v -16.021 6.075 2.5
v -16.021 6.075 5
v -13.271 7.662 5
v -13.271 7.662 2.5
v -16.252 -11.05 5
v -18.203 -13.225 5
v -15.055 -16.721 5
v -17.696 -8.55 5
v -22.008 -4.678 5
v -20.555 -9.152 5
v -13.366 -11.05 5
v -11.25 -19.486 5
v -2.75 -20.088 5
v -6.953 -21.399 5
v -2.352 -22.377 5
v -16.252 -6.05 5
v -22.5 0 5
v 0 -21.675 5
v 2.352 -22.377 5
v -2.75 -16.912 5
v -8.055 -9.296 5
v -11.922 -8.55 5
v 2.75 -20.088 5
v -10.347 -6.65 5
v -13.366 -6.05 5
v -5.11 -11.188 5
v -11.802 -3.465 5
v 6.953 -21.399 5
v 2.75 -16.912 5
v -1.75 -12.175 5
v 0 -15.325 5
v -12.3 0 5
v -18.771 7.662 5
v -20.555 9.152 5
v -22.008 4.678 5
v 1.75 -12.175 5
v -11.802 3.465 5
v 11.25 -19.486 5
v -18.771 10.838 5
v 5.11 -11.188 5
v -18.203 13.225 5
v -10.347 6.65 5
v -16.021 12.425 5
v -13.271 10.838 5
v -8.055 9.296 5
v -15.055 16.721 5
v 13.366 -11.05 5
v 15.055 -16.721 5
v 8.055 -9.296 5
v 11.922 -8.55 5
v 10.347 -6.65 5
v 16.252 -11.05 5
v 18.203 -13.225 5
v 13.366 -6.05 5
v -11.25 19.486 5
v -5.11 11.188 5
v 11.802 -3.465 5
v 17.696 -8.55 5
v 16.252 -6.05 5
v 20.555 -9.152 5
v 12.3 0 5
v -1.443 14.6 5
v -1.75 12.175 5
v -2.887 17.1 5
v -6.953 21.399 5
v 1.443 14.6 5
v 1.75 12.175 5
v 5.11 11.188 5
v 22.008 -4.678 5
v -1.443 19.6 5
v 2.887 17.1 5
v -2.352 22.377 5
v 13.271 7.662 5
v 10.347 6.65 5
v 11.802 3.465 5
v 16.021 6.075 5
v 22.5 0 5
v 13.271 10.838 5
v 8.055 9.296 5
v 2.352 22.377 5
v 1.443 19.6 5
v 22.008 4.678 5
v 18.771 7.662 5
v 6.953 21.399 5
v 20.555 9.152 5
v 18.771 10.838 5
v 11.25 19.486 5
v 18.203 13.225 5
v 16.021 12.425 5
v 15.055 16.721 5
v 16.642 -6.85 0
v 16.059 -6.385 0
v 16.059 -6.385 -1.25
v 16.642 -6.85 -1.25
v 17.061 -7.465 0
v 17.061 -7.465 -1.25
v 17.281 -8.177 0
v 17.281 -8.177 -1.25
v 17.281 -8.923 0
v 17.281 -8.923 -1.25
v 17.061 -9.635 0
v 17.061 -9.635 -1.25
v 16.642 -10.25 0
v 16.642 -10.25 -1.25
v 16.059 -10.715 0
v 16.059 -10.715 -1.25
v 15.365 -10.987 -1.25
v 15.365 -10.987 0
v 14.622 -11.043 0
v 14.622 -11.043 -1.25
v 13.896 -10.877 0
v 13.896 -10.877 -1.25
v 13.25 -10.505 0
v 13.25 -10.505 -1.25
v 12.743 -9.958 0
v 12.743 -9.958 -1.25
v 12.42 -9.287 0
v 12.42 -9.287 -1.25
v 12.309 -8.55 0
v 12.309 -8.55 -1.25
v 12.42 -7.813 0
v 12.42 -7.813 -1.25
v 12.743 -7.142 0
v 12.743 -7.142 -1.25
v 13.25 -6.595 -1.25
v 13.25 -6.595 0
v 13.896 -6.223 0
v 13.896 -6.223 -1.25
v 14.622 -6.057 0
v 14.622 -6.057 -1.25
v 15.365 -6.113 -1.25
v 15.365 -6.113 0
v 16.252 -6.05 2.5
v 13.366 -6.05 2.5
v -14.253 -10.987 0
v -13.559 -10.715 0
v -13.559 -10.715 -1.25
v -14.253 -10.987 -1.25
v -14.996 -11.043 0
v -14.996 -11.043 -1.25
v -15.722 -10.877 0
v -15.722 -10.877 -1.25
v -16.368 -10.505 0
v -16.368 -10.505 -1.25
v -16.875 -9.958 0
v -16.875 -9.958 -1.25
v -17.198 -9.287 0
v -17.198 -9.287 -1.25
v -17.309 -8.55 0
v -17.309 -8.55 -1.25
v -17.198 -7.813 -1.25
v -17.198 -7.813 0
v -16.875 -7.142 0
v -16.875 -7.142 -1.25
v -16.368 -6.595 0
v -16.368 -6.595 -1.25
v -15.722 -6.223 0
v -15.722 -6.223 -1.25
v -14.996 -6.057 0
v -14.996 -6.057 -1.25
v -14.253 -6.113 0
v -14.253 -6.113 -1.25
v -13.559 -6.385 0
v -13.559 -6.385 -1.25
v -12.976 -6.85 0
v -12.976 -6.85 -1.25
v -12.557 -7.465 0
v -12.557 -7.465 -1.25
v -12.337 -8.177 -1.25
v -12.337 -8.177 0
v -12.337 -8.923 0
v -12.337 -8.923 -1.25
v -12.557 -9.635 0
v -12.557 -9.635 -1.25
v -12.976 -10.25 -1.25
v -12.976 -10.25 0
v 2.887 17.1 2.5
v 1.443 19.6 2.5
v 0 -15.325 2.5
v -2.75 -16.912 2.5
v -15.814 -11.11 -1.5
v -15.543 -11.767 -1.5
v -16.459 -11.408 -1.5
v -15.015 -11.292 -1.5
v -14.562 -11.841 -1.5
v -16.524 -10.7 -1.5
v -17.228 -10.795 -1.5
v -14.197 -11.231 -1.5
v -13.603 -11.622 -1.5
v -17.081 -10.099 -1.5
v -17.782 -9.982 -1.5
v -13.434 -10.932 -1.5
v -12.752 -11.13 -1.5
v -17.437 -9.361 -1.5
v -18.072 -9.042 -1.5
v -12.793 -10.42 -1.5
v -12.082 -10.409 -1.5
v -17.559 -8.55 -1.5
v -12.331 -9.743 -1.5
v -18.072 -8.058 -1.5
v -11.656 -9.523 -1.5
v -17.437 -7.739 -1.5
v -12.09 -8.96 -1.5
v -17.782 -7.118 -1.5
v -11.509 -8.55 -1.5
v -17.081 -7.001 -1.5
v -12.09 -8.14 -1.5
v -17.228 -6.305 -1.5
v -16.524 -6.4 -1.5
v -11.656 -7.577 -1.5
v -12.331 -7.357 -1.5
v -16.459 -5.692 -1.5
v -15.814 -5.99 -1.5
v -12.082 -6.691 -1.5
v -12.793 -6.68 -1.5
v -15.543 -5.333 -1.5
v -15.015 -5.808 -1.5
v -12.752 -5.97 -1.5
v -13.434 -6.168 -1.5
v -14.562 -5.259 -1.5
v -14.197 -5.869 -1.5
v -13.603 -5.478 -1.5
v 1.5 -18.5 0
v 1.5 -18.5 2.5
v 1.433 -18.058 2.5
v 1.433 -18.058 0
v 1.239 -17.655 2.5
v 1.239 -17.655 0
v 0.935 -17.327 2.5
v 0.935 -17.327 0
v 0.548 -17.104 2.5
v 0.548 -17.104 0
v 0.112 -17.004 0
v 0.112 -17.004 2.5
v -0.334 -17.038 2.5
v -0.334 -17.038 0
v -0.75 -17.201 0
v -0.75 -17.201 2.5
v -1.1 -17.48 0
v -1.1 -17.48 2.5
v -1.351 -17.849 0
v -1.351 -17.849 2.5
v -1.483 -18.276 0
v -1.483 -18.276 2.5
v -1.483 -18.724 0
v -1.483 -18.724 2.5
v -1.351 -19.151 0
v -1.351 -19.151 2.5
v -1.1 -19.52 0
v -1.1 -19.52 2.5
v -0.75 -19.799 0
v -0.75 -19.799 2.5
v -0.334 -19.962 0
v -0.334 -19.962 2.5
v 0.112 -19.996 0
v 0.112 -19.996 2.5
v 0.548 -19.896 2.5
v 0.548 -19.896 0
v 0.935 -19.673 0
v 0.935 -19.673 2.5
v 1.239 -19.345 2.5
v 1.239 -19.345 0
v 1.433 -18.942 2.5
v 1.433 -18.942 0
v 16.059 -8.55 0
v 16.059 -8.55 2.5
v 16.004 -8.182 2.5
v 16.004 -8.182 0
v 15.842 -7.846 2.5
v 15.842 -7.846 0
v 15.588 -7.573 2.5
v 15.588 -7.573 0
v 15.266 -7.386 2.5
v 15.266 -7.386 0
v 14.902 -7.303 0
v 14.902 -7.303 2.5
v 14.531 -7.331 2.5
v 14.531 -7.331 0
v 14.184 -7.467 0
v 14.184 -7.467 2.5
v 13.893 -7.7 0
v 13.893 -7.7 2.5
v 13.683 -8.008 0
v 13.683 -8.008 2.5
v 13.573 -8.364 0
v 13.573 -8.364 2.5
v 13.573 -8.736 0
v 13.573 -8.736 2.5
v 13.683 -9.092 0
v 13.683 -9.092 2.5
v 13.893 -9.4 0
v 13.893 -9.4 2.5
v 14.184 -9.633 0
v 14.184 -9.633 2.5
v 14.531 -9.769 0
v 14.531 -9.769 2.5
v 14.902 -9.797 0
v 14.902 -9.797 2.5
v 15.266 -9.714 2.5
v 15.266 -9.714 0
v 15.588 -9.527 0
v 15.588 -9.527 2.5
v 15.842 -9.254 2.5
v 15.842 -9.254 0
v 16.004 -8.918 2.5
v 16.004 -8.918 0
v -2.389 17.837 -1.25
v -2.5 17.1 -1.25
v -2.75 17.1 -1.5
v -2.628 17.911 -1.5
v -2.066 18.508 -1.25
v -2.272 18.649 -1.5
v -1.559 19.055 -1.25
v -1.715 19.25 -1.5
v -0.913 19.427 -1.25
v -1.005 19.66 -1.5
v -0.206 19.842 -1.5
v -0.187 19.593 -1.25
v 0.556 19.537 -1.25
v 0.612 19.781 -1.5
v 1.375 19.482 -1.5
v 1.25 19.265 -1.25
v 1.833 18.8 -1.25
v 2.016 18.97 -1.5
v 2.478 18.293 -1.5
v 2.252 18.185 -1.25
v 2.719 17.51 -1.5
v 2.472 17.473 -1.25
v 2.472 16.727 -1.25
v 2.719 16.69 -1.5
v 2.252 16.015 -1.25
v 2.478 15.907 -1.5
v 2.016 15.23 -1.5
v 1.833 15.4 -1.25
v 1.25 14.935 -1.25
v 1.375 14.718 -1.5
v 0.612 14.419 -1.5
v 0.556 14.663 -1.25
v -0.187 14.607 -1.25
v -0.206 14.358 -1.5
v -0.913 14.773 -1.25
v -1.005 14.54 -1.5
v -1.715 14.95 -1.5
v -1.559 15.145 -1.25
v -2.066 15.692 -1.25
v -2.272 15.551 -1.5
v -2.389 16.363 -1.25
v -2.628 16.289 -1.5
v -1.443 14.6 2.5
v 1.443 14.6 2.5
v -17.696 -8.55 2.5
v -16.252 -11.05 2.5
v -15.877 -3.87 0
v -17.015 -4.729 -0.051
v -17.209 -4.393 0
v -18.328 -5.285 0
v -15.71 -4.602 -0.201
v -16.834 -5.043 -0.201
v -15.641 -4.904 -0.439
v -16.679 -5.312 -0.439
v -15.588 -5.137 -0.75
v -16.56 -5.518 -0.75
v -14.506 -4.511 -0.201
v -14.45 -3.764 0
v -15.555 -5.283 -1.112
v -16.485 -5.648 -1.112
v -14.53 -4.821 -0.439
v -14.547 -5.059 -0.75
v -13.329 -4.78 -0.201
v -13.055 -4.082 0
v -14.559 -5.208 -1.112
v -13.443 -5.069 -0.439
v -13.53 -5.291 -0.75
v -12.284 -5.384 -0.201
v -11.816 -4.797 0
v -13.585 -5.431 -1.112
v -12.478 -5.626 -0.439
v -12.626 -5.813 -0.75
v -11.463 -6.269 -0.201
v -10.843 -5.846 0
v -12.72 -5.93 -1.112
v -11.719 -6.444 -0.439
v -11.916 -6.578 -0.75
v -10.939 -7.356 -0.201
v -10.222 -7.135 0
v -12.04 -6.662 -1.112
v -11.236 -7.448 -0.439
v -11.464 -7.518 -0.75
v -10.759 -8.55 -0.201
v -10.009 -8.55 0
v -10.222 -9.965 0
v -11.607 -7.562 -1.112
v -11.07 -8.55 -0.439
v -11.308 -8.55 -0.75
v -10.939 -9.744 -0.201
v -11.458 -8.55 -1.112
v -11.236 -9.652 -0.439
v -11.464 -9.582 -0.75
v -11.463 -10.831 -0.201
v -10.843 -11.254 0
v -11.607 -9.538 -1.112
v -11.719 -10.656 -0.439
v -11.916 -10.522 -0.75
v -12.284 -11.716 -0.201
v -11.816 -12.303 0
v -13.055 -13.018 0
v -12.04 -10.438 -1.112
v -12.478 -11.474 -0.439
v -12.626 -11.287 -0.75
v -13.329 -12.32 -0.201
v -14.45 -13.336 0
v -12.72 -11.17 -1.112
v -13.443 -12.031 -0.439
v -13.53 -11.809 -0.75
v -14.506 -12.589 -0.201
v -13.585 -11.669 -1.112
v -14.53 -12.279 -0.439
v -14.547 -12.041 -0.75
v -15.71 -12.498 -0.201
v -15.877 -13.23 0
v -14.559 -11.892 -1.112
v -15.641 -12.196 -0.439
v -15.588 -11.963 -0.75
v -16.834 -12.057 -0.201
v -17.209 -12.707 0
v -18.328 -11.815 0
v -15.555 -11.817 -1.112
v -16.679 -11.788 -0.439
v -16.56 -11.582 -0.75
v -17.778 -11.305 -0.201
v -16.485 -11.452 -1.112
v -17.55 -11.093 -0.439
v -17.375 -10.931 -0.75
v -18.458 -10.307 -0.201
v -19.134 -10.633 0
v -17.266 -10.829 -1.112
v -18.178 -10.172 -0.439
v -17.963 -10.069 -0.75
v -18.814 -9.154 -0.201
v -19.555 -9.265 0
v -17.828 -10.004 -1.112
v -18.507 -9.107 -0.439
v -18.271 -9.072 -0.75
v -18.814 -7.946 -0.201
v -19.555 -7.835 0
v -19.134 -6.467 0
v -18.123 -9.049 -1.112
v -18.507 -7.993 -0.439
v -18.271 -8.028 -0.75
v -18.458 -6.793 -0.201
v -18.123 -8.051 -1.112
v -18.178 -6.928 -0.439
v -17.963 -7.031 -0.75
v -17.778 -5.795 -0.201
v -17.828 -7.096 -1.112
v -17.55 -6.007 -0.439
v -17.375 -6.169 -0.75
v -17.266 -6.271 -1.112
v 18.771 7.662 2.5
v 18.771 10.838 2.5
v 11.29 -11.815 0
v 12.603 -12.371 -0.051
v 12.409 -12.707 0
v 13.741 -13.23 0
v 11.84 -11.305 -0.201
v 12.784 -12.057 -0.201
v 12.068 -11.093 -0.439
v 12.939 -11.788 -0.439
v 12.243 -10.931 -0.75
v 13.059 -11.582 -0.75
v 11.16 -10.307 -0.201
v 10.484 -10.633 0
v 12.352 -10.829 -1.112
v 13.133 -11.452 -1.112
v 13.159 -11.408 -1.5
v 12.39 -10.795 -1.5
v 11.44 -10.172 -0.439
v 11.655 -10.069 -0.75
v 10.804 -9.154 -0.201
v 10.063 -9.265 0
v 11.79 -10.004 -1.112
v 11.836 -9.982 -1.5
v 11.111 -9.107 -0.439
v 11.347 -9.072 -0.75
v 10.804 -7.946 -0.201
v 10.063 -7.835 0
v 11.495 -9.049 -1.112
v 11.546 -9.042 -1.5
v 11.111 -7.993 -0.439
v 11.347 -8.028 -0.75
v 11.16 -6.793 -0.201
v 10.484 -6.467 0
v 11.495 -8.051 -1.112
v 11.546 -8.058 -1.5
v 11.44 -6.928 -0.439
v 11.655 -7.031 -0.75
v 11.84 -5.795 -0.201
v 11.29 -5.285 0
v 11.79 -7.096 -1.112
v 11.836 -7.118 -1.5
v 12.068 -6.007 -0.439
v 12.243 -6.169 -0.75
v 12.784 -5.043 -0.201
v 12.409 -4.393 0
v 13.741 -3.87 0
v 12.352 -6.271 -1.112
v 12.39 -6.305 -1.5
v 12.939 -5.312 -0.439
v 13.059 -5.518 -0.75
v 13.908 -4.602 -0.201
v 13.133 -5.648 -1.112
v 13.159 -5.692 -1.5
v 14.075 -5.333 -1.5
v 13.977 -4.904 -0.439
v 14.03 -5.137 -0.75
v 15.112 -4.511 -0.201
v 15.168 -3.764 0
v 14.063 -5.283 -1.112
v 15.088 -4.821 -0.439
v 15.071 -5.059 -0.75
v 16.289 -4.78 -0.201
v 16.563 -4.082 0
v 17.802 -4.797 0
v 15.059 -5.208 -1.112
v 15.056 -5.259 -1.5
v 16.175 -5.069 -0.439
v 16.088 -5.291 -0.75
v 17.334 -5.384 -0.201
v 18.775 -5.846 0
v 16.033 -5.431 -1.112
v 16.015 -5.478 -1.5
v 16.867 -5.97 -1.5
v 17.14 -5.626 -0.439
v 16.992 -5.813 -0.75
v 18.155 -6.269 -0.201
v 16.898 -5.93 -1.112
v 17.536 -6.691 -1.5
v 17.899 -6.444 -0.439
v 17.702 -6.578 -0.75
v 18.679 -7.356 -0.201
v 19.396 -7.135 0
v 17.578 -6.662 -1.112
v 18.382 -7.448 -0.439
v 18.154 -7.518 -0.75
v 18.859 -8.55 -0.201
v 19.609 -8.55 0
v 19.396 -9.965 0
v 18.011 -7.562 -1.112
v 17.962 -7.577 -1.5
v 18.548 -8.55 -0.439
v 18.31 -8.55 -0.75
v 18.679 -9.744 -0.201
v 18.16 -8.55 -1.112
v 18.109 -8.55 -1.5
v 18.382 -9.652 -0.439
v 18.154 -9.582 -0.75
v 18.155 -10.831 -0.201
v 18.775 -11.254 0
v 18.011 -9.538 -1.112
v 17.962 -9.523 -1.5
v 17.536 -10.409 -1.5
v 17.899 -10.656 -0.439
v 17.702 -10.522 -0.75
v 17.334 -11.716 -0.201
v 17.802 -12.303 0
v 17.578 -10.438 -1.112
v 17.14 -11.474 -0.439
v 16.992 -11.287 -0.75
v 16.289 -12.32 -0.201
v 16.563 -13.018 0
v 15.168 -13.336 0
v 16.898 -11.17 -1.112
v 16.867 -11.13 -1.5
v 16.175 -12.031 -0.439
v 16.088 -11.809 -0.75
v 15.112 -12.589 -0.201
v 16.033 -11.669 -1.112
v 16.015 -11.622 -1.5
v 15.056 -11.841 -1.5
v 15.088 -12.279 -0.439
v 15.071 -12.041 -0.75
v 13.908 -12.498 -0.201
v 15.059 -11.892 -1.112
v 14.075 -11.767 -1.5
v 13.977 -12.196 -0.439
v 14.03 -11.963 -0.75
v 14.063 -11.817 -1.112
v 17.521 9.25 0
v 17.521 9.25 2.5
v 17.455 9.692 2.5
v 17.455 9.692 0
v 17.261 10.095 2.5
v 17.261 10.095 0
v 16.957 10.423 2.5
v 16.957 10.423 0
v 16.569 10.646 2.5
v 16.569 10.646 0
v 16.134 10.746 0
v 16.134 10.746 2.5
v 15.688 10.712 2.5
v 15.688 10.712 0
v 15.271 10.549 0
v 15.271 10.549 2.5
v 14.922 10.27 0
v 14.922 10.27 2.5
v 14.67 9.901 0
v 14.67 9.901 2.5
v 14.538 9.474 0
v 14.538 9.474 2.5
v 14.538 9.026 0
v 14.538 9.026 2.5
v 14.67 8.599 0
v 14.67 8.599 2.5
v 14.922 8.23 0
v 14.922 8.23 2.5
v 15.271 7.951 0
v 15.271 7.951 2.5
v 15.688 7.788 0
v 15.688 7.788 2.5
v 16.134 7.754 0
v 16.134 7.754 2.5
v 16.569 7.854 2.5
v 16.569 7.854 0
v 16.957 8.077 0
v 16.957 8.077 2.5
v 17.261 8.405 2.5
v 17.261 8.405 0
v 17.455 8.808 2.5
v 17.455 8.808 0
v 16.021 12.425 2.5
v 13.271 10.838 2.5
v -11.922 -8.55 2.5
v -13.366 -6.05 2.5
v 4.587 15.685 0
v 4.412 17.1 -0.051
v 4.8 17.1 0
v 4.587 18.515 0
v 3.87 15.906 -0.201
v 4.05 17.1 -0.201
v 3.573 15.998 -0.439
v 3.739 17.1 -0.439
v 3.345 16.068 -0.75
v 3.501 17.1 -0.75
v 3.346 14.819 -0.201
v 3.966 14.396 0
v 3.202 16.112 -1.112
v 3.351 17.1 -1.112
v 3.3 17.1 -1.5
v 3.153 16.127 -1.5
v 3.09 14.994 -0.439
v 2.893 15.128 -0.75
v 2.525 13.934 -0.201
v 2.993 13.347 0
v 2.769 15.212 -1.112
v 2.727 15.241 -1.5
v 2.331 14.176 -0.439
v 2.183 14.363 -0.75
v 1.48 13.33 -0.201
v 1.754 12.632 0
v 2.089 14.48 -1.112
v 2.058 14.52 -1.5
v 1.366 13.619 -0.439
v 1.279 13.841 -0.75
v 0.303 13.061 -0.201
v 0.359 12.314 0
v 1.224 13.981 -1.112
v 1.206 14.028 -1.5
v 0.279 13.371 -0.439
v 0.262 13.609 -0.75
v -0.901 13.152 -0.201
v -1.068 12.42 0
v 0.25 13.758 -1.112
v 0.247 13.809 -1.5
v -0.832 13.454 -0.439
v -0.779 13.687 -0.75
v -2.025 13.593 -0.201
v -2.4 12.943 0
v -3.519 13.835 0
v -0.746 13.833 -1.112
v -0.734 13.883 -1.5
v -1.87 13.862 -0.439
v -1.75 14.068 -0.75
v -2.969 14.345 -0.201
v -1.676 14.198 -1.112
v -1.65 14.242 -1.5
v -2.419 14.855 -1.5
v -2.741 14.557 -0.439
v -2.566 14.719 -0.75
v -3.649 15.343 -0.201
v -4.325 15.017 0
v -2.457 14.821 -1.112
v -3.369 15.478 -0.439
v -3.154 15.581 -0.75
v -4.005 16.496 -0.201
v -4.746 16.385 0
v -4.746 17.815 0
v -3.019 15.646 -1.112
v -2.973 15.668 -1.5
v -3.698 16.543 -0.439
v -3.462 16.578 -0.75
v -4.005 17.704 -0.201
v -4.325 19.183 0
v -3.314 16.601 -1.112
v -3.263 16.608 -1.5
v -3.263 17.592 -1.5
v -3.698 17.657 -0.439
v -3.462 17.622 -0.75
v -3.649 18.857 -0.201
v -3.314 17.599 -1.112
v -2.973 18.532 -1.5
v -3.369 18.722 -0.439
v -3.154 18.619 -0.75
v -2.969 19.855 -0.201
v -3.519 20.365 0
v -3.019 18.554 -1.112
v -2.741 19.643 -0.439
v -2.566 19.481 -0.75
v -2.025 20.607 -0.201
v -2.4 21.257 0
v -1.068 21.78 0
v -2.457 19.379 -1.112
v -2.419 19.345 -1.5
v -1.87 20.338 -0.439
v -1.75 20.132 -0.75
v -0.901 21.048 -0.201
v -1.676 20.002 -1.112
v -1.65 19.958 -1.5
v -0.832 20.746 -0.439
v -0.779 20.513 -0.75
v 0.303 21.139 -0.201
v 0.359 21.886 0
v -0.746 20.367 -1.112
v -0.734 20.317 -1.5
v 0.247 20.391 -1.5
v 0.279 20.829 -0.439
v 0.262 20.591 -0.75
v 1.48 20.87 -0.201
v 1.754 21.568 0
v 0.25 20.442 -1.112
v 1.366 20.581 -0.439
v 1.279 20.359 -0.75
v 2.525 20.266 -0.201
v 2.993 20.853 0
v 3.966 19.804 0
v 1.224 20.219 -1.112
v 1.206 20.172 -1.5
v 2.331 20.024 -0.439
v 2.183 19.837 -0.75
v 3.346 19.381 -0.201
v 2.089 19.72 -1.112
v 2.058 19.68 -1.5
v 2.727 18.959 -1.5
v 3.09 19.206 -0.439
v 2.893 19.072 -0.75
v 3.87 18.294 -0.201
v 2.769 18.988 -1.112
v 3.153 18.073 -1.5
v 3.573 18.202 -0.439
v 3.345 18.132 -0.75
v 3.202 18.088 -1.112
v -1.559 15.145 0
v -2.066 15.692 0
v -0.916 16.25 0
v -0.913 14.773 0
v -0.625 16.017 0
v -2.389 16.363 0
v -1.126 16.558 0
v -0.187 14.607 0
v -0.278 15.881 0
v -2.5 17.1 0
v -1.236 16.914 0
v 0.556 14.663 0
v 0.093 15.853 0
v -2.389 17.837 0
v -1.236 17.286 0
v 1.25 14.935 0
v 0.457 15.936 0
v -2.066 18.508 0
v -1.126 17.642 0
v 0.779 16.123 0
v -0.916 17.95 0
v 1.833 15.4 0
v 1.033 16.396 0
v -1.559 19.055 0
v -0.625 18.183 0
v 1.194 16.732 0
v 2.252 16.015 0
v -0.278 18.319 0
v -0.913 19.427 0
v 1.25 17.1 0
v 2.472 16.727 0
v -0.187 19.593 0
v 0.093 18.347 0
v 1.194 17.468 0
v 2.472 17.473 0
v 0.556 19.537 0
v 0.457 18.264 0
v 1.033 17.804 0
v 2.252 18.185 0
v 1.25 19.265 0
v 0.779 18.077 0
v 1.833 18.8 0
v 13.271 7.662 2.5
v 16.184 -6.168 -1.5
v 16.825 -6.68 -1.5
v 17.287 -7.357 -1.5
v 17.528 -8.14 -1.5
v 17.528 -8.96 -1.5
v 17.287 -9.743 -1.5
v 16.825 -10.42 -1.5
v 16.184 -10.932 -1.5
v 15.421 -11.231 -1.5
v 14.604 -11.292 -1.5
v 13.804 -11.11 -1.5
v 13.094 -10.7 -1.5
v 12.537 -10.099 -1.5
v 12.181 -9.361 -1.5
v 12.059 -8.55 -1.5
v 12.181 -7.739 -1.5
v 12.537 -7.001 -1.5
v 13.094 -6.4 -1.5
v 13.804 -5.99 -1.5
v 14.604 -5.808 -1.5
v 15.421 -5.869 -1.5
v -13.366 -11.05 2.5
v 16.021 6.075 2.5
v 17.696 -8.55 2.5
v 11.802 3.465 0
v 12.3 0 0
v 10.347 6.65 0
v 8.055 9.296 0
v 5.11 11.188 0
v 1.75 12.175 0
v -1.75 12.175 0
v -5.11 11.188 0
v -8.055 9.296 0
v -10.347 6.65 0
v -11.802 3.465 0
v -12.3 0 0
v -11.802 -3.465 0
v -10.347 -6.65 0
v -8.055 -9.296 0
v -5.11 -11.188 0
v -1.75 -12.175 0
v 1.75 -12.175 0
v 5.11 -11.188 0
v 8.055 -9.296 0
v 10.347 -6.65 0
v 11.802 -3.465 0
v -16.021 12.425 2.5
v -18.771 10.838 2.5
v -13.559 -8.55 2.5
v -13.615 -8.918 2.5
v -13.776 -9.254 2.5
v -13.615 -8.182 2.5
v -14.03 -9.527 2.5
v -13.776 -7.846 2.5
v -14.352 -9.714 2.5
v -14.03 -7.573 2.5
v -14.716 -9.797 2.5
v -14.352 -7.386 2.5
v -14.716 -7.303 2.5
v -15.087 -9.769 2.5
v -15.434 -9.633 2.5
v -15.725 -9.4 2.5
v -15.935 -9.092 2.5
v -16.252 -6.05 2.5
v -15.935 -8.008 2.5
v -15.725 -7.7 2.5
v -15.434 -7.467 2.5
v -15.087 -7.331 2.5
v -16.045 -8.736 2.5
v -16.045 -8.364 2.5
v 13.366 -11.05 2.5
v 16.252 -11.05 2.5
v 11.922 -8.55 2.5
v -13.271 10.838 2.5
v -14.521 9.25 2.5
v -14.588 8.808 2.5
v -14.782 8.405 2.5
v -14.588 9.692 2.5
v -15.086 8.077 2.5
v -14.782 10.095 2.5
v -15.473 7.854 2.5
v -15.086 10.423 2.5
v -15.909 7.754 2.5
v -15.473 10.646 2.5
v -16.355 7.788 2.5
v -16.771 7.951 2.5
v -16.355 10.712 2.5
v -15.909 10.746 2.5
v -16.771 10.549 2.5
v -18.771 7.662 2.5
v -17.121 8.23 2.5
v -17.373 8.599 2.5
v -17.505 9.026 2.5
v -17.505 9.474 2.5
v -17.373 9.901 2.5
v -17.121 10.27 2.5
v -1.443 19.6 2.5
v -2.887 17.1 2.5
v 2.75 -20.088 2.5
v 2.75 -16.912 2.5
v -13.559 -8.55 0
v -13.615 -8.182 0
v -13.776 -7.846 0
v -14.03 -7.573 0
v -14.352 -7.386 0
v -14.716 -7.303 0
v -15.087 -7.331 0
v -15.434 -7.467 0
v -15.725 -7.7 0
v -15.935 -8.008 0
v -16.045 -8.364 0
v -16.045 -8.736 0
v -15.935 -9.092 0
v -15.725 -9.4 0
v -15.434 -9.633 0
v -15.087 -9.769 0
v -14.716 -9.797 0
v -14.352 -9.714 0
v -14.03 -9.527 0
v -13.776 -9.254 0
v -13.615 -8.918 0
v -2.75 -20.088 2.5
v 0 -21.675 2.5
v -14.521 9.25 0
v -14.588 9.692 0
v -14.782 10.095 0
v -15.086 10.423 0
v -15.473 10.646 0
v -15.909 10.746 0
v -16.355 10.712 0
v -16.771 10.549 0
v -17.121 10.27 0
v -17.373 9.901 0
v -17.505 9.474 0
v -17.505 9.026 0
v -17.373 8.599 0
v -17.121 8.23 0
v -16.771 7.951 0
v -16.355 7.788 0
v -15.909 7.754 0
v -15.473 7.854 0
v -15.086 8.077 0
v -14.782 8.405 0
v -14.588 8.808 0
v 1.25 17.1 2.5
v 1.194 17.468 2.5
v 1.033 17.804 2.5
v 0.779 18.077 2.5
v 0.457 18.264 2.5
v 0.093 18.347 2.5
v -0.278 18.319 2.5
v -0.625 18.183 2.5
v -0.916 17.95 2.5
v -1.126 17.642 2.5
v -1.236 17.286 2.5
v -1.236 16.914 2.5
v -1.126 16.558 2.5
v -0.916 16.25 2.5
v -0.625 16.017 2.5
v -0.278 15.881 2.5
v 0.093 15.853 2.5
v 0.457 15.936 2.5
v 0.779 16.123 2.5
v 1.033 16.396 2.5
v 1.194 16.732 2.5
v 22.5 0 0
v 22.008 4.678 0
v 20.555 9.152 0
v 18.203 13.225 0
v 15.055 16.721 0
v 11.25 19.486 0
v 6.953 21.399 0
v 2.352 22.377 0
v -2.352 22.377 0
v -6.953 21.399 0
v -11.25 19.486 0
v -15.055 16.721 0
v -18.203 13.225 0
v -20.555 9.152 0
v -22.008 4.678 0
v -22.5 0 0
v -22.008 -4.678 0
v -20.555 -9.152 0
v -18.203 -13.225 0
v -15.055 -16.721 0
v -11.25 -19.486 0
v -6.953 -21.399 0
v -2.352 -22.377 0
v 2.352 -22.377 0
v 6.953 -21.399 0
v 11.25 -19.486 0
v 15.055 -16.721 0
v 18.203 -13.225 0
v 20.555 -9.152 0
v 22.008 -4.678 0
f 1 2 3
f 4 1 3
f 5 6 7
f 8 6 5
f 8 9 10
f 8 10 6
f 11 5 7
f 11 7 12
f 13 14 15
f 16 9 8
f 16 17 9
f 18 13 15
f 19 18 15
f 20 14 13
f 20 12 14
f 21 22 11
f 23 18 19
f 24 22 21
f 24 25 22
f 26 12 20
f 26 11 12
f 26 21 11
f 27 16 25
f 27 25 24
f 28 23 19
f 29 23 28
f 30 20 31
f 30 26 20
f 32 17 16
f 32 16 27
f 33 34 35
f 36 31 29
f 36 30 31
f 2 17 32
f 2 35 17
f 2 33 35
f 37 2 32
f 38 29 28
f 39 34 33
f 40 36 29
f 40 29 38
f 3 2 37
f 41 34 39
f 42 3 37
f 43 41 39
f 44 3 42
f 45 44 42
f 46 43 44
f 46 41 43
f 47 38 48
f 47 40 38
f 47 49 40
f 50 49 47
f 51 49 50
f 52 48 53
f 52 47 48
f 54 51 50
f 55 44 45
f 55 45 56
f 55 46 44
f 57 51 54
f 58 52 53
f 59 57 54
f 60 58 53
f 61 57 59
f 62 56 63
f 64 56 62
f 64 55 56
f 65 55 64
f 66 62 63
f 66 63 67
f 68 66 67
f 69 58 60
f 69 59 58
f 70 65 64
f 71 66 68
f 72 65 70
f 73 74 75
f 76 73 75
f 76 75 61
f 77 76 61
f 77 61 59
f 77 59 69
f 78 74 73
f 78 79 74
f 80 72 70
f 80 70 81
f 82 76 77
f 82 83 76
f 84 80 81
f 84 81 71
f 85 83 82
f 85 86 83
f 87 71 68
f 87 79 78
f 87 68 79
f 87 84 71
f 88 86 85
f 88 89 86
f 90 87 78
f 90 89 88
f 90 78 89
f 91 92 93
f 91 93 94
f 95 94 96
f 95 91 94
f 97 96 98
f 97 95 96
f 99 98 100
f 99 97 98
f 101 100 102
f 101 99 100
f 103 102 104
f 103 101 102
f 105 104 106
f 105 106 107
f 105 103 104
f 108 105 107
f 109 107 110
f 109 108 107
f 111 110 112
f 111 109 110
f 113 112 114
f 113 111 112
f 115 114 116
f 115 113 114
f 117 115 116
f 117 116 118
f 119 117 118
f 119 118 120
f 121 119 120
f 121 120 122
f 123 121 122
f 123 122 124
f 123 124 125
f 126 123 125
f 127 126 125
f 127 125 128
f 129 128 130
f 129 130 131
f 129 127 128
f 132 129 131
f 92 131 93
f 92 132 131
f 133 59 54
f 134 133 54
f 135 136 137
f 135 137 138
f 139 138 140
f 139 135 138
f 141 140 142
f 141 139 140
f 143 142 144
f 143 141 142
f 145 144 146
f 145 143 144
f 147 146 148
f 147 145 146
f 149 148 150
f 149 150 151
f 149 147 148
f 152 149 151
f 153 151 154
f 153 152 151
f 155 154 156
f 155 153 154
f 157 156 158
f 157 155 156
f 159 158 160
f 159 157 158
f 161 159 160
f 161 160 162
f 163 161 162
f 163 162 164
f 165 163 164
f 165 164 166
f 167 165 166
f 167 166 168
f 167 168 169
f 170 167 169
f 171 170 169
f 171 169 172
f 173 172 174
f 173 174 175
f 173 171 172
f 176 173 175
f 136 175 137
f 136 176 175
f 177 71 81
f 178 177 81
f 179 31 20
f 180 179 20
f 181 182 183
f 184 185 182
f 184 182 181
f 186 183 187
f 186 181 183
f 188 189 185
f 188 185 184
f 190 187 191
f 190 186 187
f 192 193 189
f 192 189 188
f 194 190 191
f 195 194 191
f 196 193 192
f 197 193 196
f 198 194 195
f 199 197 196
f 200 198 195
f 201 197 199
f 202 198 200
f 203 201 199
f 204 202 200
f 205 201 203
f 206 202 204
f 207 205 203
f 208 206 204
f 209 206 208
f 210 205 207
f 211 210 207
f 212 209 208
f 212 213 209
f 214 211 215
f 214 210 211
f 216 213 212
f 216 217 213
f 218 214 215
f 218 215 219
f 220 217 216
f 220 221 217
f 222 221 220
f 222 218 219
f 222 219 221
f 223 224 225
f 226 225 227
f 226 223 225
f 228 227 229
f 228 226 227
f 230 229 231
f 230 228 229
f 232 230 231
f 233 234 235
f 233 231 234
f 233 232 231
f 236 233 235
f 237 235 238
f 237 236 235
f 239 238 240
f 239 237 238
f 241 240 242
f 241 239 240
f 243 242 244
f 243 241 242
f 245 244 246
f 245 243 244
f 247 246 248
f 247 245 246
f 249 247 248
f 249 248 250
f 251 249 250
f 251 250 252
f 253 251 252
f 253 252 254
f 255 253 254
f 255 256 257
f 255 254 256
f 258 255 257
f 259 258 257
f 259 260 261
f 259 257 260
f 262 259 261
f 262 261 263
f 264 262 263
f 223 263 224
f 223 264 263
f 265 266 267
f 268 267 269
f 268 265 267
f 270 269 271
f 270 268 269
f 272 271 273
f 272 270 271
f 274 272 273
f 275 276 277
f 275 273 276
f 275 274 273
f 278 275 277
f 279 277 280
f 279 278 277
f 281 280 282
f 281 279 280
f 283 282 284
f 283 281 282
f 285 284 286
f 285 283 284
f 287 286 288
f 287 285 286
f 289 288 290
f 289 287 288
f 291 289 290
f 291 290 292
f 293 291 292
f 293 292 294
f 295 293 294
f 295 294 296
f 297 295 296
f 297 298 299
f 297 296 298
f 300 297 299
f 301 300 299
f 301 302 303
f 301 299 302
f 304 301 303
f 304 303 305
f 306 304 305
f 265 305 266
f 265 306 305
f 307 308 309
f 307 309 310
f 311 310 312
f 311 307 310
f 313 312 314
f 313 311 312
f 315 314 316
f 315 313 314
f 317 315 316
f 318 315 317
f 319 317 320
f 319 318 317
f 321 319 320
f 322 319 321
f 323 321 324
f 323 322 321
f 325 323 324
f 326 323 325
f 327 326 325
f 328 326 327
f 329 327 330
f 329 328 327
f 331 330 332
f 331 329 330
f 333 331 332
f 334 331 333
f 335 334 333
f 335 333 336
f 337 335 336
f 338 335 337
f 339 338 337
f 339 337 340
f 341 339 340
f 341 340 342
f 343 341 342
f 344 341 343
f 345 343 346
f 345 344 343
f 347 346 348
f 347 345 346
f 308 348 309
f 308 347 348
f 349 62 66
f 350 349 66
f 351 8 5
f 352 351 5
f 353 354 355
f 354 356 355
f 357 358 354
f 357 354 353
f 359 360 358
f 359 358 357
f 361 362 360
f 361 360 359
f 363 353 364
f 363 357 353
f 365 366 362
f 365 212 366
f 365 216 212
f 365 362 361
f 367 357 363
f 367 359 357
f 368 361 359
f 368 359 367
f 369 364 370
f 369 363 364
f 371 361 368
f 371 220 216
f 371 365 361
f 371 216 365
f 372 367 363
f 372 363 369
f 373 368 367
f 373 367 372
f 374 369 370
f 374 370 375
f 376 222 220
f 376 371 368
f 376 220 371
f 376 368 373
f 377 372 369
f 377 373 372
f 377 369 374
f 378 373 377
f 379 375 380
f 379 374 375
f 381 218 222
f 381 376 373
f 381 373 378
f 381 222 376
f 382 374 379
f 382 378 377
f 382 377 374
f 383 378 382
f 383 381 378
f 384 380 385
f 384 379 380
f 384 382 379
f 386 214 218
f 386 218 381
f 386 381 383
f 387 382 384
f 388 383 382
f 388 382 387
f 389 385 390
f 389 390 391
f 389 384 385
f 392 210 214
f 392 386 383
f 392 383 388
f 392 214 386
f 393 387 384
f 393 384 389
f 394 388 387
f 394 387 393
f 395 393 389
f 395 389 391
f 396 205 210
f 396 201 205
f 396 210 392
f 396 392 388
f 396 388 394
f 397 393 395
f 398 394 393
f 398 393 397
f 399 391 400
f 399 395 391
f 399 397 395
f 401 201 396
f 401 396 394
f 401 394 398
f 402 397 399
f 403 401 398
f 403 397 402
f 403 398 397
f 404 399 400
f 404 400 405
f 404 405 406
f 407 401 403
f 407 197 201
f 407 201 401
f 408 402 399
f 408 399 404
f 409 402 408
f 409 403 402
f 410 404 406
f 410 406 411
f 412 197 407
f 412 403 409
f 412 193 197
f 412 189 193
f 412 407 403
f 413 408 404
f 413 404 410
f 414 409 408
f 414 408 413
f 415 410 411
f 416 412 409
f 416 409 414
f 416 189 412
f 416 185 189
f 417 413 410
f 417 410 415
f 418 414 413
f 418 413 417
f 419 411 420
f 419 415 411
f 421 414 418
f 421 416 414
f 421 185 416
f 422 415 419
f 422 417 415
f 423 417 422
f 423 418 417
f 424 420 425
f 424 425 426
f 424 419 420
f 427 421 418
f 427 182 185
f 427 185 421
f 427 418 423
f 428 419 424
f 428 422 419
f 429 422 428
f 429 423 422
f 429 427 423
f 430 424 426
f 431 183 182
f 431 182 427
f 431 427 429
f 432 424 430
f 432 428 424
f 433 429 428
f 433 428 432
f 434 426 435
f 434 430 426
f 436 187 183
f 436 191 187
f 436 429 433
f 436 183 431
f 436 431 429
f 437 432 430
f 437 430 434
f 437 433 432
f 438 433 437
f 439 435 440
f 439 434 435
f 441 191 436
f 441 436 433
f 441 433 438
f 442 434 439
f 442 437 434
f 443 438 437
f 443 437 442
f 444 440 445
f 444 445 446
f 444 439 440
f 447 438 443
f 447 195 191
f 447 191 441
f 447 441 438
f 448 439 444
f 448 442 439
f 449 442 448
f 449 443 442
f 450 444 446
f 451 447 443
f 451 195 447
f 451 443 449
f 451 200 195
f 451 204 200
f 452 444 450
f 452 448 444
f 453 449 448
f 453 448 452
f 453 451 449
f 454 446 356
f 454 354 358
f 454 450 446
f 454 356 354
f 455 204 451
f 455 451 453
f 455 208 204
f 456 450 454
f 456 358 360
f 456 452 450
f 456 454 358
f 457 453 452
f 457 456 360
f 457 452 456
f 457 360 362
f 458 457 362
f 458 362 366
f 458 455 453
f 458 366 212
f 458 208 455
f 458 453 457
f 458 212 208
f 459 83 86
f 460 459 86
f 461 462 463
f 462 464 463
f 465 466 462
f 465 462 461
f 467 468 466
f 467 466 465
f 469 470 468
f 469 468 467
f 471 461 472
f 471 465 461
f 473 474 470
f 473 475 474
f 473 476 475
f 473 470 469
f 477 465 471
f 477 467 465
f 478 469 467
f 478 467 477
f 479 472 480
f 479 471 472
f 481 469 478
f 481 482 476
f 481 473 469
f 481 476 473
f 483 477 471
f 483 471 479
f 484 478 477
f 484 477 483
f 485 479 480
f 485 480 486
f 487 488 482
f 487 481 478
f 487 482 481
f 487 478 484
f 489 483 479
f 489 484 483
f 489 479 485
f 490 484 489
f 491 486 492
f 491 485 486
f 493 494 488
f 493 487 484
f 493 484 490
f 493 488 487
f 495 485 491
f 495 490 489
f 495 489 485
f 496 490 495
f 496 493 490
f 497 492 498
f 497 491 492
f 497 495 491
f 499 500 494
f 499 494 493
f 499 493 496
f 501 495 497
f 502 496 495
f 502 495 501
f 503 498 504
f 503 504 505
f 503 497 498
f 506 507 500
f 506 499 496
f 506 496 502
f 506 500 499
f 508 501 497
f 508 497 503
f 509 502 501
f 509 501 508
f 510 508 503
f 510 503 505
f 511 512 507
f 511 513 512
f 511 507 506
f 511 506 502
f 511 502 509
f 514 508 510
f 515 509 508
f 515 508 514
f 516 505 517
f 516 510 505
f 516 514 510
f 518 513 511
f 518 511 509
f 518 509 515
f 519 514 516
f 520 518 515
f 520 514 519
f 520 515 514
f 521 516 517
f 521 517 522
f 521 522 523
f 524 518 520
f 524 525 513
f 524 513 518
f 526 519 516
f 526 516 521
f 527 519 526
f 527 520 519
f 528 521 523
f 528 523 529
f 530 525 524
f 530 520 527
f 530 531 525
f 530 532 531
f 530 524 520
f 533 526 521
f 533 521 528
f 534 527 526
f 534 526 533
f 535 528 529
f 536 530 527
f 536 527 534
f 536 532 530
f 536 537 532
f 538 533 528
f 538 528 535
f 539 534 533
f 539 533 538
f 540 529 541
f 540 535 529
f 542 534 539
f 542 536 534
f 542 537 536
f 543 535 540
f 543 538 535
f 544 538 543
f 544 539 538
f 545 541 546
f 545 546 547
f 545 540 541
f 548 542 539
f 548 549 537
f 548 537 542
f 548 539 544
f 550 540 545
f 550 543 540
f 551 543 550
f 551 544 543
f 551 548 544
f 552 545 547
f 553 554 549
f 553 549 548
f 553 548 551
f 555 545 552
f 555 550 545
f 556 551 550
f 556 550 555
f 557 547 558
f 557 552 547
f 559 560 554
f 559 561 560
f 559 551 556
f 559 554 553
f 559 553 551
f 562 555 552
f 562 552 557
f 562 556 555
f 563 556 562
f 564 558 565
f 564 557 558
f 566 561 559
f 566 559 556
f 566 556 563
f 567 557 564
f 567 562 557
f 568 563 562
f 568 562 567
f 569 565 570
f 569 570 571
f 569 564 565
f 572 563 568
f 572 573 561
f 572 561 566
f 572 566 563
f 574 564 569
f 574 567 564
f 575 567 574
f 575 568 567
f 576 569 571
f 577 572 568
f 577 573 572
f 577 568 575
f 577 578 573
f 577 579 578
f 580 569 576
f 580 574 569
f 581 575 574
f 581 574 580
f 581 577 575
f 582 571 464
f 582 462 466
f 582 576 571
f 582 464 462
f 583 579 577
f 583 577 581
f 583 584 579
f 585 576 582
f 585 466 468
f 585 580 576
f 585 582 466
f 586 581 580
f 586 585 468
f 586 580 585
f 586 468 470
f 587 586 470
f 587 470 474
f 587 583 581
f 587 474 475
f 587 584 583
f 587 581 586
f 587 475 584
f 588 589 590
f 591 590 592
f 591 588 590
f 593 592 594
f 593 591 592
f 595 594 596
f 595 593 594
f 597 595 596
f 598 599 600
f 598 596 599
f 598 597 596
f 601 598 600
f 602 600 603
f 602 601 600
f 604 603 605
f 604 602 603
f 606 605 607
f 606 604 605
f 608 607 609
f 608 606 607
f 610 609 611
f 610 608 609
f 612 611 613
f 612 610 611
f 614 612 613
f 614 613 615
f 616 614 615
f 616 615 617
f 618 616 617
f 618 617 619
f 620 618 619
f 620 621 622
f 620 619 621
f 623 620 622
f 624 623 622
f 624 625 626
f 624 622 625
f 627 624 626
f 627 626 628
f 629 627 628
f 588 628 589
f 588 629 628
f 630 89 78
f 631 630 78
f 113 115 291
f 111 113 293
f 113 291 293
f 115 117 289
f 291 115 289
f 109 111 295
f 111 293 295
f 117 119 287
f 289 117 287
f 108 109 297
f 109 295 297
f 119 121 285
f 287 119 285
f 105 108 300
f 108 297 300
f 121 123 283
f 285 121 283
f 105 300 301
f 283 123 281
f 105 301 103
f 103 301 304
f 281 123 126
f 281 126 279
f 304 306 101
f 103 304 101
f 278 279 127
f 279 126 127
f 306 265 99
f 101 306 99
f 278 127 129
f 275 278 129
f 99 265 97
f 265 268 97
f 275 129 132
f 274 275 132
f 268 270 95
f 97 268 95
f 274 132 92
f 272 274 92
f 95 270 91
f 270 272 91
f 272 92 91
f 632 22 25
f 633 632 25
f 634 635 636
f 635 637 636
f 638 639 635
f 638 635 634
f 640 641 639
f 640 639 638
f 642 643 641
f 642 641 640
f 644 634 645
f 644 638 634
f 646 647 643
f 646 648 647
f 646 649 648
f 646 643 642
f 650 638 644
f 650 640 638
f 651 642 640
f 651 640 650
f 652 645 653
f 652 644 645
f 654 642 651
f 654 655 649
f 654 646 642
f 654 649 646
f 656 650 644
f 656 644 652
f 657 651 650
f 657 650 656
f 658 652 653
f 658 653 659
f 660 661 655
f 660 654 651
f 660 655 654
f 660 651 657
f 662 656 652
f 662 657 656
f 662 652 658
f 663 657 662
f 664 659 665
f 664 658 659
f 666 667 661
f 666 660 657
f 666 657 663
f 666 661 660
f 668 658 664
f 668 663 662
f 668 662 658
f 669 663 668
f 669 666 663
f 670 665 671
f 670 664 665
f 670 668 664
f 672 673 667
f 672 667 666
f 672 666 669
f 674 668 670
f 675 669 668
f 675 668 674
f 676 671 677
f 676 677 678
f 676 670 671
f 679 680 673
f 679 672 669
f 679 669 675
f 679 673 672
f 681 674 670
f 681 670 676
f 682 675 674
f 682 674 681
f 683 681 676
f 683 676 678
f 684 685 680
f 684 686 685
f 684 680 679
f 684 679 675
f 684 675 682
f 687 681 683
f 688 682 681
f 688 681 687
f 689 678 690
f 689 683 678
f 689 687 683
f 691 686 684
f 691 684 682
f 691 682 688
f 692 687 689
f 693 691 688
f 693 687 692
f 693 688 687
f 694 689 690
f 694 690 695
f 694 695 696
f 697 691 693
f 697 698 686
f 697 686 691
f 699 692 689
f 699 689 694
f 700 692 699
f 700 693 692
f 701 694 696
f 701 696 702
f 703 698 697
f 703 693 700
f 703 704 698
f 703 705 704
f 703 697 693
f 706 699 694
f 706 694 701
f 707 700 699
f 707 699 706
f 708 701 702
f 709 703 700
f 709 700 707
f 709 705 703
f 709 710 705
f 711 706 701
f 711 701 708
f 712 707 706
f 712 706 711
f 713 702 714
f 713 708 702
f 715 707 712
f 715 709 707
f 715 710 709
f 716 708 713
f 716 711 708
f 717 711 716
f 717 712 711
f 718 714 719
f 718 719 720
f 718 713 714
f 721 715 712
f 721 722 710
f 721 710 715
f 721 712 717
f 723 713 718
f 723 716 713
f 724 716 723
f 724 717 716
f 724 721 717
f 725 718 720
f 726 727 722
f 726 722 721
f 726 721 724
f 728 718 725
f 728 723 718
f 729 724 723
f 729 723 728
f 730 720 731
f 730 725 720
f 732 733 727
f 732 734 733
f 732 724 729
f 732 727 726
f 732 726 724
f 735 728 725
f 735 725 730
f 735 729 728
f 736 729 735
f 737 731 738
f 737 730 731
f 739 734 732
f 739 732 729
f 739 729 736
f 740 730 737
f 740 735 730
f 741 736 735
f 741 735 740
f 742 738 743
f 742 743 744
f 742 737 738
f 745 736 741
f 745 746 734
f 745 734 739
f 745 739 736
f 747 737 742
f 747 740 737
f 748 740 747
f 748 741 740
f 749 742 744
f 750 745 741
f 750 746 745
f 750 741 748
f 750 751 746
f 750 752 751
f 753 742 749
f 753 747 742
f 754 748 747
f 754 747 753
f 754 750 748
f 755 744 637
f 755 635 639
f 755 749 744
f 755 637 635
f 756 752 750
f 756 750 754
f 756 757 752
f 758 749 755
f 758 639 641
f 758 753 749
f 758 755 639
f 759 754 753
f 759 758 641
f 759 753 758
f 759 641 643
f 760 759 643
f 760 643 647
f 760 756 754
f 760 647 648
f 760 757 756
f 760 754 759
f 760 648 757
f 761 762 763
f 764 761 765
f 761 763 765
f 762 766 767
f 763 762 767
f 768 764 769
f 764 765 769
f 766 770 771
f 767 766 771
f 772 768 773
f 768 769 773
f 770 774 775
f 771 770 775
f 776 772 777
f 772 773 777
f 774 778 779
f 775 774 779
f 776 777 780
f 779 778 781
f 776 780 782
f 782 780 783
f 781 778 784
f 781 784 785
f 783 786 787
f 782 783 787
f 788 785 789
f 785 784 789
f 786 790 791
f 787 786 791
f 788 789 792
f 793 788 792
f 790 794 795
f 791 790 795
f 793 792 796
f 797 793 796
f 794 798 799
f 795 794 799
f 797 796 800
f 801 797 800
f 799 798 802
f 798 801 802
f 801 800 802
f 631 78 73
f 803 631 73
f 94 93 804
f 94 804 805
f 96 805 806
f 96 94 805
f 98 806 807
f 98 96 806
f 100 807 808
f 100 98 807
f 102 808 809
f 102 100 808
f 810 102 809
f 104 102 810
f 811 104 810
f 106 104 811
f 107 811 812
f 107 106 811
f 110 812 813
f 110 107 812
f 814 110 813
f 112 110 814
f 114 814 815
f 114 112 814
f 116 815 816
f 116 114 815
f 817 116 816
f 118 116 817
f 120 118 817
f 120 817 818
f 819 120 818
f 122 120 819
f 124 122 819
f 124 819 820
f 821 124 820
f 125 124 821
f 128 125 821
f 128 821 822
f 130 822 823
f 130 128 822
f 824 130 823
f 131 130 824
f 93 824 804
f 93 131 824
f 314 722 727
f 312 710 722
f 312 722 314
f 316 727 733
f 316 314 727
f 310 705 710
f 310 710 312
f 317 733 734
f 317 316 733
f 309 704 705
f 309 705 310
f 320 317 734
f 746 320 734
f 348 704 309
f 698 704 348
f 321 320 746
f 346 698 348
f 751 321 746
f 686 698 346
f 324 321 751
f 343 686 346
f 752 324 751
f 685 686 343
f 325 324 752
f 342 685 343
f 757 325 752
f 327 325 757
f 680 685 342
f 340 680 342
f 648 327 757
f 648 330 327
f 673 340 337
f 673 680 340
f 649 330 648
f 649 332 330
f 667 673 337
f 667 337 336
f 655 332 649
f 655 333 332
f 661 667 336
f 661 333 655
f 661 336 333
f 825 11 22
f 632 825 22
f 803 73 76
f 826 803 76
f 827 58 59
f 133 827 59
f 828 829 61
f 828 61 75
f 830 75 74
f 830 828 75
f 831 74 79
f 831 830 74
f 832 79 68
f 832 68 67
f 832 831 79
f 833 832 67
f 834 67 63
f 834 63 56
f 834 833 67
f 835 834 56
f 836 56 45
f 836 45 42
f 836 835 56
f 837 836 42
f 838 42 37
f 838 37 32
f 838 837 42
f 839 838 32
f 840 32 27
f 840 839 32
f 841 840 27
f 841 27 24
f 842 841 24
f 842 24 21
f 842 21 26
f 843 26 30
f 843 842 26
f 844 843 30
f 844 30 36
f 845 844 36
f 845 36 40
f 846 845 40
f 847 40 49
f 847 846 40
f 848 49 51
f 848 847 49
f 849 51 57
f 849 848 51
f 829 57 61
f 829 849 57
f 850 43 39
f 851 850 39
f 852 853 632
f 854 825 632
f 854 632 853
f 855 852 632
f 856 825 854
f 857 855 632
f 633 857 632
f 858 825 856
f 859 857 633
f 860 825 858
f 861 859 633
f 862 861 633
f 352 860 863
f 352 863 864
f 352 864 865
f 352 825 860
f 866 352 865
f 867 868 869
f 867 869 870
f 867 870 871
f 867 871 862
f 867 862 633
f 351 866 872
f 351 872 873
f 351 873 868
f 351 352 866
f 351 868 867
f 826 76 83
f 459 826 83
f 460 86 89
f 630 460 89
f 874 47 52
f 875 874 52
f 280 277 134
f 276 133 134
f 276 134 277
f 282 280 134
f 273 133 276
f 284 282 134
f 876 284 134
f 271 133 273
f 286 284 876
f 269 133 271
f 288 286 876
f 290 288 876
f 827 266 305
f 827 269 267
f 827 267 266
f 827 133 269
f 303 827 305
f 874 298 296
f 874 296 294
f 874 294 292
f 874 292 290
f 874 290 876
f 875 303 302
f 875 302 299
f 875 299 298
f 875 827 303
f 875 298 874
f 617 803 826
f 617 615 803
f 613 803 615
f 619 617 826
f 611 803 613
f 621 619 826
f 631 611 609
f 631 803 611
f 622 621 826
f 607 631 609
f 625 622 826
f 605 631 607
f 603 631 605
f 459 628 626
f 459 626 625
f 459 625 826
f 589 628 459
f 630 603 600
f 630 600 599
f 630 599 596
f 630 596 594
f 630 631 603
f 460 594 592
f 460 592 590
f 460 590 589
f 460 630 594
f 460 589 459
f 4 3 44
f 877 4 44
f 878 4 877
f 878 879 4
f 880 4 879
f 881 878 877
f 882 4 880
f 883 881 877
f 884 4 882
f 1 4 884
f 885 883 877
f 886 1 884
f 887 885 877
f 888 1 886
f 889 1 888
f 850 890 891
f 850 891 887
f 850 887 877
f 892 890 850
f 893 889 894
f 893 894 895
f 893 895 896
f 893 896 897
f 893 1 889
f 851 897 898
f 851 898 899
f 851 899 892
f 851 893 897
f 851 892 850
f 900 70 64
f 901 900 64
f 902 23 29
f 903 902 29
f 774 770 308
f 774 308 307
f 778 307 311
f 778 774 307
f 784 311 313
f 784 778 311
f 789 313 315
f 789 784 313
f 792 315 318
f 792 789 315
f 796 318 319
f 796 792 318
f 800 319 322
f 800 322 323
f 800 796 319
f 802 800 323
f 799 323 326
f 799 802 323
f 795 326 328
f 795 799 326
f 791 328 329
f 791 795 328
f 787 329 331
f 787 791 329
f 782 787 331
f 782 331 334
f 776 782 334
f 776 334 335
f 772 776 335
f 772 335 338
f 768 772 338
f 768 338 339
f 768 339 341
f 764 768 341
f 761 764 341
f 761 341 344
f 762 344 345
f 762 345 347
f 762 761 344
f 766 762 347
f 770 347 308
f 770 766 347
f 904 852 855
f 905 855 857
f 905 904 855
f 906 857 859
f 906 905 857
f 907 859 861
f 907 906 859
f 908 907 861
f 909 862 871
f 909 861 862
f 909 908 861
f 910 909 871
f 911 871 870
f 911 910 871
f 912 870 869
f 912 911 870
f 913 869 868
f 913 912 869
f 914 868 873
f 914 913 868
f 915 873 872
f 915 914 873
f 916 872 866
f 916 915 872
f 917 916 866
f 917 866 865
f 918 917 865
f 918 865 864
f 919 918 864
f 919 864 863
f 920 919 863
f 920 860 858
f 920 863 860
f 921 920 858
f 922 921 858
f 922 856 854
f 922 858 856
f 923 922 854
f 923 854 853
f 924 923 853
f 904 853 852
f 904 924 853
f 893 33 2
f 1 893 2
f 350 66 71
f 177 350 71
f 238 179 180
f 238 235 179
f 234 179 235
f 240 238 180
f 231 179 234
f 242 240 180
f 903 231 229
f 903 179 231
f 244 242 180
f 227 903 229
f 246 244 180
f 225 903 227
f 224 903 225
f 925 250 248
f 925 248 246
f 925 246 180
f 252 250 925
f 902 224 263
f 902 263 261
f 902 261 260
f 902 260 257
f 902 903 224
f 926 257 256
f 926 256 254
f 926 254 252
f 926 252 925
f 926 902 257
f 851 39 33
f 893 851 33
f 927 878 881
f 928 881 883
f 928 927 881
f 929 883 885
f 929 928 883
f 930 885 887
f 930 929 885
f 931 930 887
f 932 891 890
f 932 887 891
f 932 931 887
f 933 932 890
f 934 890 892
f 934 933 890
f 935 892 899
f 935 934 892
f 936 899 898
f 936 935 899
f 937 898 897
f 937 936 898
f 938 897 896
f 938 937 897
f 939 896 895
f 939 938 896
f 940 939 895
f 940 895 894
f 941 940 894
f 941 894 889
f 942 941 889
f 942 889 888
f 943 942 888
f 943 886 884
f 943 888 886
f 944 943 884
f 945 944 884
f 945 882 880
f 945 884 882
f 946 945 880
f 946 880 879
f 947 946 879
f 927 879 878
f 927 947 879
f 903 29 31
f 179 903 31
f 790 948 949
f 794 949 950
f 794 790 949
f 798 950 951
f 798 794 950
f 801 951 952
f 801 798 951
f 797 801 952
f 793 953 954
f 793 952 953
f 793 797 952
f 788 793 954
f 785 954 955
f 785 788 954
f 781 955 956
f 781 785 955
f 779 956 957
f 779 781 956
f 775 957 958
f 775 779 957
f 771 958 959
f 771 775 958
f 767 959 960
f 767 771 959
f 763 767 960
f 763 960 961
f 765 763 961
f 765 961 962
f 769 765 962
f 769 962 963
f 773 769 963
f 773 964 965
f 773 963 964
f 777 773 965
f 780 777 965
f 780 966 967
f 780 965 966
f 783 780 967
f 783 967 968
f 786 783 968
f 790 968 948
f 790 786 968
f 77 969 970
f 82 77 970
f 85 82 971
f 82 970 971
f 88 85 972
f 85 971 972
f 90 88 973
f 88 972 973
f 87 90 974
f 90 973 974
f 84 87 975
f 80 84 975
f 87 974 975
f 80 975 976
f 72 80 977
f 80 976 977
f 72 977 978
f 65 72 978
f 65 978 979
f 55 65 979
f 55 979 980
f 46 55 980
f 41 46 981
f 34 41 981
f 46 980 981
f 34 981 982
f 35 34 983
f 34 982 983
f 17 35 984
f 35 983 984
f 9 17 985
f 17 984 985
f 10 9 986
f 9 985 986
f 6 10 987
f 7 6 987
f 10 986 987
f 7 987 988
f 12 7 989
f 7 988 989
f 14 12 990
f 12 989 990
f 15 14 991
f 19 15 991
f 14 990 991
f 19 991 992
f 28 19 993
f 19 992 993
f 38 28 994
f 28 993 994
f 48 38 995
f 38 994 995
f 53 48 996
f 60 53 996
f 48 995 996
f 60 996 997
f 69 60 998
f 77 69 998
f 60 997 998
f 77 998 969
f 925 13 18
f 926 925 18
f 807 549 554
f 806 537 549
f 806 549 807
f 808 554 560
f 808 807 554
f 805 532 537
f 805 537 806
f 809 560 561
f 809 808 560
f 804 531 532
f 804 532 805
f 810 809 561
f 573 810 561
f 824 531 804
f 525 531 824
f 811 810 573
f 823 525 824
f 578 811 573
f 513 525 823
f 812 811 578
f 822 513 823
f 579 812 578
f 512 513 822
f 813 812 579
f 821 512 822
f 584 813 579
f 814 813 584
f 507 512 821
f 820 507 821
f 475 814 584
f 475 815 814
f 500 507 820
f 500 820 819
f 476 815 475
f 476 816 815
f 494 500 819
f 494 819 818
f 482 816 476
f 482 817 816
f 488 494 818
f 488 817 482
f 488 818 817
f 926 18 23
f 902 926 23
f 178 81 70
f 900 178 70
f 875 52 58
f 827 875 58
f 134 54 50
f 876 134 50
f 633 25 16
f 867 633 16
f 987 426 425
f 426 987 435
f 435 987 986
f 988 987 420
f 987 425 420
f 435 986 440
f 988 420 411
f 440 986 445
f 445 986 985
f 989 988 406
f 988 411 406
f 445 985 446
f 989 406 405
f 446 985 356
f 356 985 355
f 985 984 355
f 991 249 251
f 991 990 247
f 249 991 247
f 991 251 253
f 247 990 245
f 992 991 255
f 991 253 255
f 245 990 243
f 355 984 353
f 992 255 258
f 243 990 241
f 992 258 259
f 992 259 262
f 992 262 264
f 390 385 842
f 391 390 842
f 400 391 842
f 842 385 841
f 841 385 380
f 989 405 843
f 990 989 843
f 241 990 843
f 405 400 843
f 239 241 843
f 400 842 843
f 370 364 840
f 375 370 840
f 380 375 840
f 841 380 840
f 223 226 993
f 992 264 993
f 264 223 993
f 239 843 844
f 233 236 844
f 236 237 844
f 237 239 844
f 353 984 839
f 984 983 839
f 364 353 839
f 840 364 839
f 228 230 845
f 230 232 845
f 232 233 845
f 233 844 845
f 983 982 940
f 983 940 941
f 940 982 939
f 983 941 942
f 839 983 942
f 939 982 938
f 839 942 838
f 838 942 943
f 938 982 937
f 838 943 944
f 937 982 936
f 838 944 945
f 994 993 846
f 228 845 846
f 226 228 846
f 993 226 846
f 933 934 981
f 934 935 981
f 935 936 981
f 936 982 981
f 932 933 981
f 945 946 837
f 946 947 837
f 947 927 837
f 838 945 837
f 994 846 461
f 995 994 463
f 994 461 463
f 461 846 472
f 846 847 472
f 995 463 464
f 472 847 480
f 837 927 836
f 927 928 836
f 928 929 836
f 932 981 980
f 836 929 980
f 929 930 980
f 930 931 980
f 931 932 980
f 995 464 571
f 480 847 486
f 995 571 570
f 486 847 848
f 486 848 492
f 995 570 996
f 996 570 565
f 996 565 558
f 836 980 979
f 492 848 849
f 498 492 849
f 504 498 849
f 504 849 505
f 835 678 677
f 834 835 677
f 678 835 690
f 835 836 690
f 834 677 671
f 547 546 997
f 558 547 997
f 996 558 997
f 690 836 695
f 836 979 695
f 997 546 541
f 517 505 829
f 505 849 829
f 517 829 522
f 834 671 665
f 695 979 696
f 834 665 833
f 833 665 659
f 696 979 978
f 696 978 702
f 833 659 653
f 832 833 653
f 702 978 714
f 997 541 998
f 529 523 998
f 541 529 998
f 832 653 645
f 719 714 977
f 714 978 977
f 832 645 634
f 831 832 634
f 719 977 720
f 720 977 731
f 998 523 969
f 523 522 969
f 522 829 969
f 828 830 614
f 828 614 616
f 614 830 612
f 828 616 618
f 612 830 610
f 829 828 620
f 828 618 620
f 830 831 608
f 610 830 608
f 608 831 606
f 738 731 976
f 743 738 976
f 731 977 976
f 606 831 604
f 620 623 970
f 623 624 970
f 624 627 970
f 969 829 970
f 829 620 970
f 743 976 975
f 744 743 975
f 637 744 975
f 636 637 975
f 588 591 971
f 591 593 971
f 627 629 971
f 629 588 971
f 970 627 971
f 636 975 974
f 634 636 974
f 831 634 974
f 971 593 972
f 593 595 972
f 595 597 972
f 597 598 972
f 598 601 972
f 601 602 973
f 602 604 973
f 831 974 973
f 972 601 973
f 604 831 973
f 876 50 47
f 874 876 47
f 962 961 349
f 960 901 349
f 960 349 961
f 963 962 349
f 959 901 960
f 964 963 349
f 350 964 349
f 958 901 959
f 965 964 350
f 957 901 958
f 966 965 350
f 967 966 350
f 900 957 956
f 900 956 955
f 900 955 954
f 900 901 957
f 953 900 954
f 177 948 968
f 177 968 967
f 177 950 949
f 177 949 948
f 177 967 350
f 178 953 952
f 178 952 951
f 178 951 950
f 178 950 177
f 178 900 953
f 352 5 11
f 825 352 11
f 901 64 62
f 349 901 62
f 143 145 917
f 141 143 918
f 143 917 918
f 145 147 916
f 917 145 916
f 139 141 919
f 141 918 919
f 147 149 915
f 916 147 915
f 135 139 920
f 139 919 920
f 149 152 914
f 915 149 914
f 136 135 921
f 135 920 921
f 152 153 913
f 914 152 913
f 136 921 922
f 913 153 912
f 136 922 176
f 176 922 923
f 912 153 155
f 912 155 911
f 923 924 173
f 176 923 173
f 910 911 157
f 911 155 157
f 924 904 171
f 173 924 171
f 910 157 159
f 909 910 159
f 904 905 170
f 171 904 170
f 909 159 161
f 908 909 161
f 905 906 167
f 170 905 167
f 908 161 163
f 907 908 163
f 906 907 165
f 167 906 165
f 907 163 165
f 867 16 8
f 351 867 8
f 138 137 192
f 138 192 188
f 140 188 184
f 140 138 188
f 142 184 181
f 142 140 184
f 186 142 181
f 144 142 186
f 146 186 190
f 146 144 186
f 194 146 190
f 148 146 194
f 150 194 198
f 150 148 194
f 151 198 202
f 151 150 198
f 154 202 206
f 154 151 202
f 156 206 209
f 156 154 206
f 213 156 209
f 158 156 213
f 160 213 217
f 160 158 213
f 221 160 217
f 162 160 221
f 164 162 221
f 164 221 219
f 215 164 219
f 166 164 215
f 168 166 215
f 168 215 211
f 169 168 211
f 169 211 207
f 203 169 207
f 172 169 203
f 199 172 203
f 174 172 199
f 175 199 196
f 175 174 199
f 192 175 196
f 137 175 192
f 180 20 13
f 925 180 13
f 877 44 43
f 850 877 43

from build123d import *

# Parameters (mm, degrees)
SKETCH2_R                    = 22.5
SKETCH2_R_2                  = 12.3
SKETCH2_R_3                  = 1.25
SKETCH2_R_4                  = 1.5
BOSS_EXTRUDE1_DEPTH          = 5
CUT_EXTRUDE1_DEPTH           = 2.5
CIRPATTERN1_COUNT            = 3
SKETCH4_R                    = 3.3
SKETCH4_R_2                  = 2.5
BOSS_EXTRUDE2_DEPTH          = 1.5
FILLET1_R                    = 1.5
CHAMFER1_SIZE                = 0.25
CIRPATTERN2_COUNT            = 3
FILLET1_OF_CIRPATTERN2_R     = 1.5
CHAMFER1_OF_CIRPATTERN2_SIZE = 0.25


with BuildPart() as part:
    # Sketch2 → Boss-Extrude1 (new body)
    with BuildSketch(Plane.XY):
        Circle(SKETCH2_R)
        Circle(SKETCH2_R_2, mode=Mode.SUBTRACT)
        with Locations((0, 17.1)):
            Circle(SKETCH2_R_3, mode=Mode.SUBTRACT)
        with Locations((14.809034405, -8.55)):
            Circle(SKETCH2_R_3, mode=Mode.SUBTRACT)
        with Locations((16.02146997, 9.25)):
            Circle(SKETCH2_R_4, mode=Mode.SUBTRACT)
        with Locations((0, -18.5)):
            Circle(SKETCH2_R_4, mode=Mode.SUBTRACT)
        with Locations((-14.809034405, -8.55)):
            Circle(SKETCH2_R_3, mode=Mode.SUBTRACT)
        with Locations((-16.02146997, 9.25)):
            Circle(SKETCH2_R_4, mode=Mode.SUBTRACT)
    extrude(amount=BOSS_EXTRUDE1_DEPTH)

    # Sketch3 → Cut-Extrude1 (cut)
    with BuildSketch(Plane.XY.offset(5)):
        Polygon((-2.886751346, 17.1), (-1.443375673, 14.6), (1.443375673, 14.6), (2.886751346, 17.1), (1.443375673, 19.6), (-1.443375673, 19.6), align=None)
        Polygon((16.02146997, 6.074573519), (18.77146997, 7.66228676), (18.77146997, 10.83771324), (16.02146997, 12.425426481), (13.27146997, 10.83771324), (13.27146997, 7.66228676), align=None)
    cut_extrude1 = extrude(amount=-CUT_EXTRUDE1_DEPTH, mode=Mode.SUBTRACT)

    # CirPattern1: Cut-Extrude1 ×3 about axis
    cirpattern1_axis = Axis((0, 0, 0), (0, 0, 1))
    for i in range(1, CIRPATTERN1_COUNT):
        add(cut_extrude1.rotate(cirpattern1_axis, i * 360 / CIRPATTERN1_COUNT), mode=Mode.SUBTRACT)

    # Sketch4 → Boss-Extrude2 (add)
    with BuildSketch(Plane(origin=(0, 0, 0), x_dir=(-1, 0, 0), z_dir=(0, 0, -1))):
        with Locations(Location((0, 17.1, 0), (0, 0, 180))):
            Circle(SKETCH4_R)
        with Locations((0, 17.1)):
            Circle(SKETCH4_R_2, mode=Mode.SUBTRACT)
    boss_extrude2 = extrude(amount=BOSS_EXTRUDE2_DEPTH)

    # Fillet1
    fillet1_edges = [part.edges().sort_by_distance(p)[0] for p in [
        (-3.3, 17.1, 0),
    ]]
    fillet(fillet1_edges, radius=FILLET1_R - 0.0001)  # a hair under: the kernel refuses the full size

    # Chamfer1
    chamfer1_edges = [part.edges().sort_by_distance(p)[0] for p in [
        (2.5, 17.1, -1.5),
    ]]
    chamfer(chamfer1_edges, length=CHAMFER1_SIZE)

    # CirPattern2: Boss-Extrude2 ×3 about axis
    cirpattern2_axis = Axis((0, 0, 0), (0, 0, 1))
    for i in range(1, CIRPATTERN2_COUNT):
        add(boss_extrude2.rotate(cirpattern2_axis, i * 360 / CIRPATTERN2_COUNT))

    # Fillet1 of CirPattern2
    fillet1_of_cirpattern2_edges = [part.edges().sort_by_distance(p)[0] for p in [
        (-13.159034405, -11.407883832, 0),
        (16.459034405, -5.692116168, 0),
    ]]
    fillet(fillet1_of_cirpattern2_edges, radius=FILLET1_OF_CIRPATTERN2_R - 0.0001)  # a hair under: the kernel refuses the full size

    # Chamfer1 of CirPattern2
    chamfer1_of_cirpattern2_edges = [part.edges().sort_by_distance(p)[0] for p in [
        (-16.059034405, -6.384936491, -1.5),
        (13.559034405, -10.715063509, -1.5),
    ]]
    chamfer(chamfer1_of_cirpattern2_edges, length=CHAMFER1_OF_CIRPATTERN2_SIZE)


solid = part.part
